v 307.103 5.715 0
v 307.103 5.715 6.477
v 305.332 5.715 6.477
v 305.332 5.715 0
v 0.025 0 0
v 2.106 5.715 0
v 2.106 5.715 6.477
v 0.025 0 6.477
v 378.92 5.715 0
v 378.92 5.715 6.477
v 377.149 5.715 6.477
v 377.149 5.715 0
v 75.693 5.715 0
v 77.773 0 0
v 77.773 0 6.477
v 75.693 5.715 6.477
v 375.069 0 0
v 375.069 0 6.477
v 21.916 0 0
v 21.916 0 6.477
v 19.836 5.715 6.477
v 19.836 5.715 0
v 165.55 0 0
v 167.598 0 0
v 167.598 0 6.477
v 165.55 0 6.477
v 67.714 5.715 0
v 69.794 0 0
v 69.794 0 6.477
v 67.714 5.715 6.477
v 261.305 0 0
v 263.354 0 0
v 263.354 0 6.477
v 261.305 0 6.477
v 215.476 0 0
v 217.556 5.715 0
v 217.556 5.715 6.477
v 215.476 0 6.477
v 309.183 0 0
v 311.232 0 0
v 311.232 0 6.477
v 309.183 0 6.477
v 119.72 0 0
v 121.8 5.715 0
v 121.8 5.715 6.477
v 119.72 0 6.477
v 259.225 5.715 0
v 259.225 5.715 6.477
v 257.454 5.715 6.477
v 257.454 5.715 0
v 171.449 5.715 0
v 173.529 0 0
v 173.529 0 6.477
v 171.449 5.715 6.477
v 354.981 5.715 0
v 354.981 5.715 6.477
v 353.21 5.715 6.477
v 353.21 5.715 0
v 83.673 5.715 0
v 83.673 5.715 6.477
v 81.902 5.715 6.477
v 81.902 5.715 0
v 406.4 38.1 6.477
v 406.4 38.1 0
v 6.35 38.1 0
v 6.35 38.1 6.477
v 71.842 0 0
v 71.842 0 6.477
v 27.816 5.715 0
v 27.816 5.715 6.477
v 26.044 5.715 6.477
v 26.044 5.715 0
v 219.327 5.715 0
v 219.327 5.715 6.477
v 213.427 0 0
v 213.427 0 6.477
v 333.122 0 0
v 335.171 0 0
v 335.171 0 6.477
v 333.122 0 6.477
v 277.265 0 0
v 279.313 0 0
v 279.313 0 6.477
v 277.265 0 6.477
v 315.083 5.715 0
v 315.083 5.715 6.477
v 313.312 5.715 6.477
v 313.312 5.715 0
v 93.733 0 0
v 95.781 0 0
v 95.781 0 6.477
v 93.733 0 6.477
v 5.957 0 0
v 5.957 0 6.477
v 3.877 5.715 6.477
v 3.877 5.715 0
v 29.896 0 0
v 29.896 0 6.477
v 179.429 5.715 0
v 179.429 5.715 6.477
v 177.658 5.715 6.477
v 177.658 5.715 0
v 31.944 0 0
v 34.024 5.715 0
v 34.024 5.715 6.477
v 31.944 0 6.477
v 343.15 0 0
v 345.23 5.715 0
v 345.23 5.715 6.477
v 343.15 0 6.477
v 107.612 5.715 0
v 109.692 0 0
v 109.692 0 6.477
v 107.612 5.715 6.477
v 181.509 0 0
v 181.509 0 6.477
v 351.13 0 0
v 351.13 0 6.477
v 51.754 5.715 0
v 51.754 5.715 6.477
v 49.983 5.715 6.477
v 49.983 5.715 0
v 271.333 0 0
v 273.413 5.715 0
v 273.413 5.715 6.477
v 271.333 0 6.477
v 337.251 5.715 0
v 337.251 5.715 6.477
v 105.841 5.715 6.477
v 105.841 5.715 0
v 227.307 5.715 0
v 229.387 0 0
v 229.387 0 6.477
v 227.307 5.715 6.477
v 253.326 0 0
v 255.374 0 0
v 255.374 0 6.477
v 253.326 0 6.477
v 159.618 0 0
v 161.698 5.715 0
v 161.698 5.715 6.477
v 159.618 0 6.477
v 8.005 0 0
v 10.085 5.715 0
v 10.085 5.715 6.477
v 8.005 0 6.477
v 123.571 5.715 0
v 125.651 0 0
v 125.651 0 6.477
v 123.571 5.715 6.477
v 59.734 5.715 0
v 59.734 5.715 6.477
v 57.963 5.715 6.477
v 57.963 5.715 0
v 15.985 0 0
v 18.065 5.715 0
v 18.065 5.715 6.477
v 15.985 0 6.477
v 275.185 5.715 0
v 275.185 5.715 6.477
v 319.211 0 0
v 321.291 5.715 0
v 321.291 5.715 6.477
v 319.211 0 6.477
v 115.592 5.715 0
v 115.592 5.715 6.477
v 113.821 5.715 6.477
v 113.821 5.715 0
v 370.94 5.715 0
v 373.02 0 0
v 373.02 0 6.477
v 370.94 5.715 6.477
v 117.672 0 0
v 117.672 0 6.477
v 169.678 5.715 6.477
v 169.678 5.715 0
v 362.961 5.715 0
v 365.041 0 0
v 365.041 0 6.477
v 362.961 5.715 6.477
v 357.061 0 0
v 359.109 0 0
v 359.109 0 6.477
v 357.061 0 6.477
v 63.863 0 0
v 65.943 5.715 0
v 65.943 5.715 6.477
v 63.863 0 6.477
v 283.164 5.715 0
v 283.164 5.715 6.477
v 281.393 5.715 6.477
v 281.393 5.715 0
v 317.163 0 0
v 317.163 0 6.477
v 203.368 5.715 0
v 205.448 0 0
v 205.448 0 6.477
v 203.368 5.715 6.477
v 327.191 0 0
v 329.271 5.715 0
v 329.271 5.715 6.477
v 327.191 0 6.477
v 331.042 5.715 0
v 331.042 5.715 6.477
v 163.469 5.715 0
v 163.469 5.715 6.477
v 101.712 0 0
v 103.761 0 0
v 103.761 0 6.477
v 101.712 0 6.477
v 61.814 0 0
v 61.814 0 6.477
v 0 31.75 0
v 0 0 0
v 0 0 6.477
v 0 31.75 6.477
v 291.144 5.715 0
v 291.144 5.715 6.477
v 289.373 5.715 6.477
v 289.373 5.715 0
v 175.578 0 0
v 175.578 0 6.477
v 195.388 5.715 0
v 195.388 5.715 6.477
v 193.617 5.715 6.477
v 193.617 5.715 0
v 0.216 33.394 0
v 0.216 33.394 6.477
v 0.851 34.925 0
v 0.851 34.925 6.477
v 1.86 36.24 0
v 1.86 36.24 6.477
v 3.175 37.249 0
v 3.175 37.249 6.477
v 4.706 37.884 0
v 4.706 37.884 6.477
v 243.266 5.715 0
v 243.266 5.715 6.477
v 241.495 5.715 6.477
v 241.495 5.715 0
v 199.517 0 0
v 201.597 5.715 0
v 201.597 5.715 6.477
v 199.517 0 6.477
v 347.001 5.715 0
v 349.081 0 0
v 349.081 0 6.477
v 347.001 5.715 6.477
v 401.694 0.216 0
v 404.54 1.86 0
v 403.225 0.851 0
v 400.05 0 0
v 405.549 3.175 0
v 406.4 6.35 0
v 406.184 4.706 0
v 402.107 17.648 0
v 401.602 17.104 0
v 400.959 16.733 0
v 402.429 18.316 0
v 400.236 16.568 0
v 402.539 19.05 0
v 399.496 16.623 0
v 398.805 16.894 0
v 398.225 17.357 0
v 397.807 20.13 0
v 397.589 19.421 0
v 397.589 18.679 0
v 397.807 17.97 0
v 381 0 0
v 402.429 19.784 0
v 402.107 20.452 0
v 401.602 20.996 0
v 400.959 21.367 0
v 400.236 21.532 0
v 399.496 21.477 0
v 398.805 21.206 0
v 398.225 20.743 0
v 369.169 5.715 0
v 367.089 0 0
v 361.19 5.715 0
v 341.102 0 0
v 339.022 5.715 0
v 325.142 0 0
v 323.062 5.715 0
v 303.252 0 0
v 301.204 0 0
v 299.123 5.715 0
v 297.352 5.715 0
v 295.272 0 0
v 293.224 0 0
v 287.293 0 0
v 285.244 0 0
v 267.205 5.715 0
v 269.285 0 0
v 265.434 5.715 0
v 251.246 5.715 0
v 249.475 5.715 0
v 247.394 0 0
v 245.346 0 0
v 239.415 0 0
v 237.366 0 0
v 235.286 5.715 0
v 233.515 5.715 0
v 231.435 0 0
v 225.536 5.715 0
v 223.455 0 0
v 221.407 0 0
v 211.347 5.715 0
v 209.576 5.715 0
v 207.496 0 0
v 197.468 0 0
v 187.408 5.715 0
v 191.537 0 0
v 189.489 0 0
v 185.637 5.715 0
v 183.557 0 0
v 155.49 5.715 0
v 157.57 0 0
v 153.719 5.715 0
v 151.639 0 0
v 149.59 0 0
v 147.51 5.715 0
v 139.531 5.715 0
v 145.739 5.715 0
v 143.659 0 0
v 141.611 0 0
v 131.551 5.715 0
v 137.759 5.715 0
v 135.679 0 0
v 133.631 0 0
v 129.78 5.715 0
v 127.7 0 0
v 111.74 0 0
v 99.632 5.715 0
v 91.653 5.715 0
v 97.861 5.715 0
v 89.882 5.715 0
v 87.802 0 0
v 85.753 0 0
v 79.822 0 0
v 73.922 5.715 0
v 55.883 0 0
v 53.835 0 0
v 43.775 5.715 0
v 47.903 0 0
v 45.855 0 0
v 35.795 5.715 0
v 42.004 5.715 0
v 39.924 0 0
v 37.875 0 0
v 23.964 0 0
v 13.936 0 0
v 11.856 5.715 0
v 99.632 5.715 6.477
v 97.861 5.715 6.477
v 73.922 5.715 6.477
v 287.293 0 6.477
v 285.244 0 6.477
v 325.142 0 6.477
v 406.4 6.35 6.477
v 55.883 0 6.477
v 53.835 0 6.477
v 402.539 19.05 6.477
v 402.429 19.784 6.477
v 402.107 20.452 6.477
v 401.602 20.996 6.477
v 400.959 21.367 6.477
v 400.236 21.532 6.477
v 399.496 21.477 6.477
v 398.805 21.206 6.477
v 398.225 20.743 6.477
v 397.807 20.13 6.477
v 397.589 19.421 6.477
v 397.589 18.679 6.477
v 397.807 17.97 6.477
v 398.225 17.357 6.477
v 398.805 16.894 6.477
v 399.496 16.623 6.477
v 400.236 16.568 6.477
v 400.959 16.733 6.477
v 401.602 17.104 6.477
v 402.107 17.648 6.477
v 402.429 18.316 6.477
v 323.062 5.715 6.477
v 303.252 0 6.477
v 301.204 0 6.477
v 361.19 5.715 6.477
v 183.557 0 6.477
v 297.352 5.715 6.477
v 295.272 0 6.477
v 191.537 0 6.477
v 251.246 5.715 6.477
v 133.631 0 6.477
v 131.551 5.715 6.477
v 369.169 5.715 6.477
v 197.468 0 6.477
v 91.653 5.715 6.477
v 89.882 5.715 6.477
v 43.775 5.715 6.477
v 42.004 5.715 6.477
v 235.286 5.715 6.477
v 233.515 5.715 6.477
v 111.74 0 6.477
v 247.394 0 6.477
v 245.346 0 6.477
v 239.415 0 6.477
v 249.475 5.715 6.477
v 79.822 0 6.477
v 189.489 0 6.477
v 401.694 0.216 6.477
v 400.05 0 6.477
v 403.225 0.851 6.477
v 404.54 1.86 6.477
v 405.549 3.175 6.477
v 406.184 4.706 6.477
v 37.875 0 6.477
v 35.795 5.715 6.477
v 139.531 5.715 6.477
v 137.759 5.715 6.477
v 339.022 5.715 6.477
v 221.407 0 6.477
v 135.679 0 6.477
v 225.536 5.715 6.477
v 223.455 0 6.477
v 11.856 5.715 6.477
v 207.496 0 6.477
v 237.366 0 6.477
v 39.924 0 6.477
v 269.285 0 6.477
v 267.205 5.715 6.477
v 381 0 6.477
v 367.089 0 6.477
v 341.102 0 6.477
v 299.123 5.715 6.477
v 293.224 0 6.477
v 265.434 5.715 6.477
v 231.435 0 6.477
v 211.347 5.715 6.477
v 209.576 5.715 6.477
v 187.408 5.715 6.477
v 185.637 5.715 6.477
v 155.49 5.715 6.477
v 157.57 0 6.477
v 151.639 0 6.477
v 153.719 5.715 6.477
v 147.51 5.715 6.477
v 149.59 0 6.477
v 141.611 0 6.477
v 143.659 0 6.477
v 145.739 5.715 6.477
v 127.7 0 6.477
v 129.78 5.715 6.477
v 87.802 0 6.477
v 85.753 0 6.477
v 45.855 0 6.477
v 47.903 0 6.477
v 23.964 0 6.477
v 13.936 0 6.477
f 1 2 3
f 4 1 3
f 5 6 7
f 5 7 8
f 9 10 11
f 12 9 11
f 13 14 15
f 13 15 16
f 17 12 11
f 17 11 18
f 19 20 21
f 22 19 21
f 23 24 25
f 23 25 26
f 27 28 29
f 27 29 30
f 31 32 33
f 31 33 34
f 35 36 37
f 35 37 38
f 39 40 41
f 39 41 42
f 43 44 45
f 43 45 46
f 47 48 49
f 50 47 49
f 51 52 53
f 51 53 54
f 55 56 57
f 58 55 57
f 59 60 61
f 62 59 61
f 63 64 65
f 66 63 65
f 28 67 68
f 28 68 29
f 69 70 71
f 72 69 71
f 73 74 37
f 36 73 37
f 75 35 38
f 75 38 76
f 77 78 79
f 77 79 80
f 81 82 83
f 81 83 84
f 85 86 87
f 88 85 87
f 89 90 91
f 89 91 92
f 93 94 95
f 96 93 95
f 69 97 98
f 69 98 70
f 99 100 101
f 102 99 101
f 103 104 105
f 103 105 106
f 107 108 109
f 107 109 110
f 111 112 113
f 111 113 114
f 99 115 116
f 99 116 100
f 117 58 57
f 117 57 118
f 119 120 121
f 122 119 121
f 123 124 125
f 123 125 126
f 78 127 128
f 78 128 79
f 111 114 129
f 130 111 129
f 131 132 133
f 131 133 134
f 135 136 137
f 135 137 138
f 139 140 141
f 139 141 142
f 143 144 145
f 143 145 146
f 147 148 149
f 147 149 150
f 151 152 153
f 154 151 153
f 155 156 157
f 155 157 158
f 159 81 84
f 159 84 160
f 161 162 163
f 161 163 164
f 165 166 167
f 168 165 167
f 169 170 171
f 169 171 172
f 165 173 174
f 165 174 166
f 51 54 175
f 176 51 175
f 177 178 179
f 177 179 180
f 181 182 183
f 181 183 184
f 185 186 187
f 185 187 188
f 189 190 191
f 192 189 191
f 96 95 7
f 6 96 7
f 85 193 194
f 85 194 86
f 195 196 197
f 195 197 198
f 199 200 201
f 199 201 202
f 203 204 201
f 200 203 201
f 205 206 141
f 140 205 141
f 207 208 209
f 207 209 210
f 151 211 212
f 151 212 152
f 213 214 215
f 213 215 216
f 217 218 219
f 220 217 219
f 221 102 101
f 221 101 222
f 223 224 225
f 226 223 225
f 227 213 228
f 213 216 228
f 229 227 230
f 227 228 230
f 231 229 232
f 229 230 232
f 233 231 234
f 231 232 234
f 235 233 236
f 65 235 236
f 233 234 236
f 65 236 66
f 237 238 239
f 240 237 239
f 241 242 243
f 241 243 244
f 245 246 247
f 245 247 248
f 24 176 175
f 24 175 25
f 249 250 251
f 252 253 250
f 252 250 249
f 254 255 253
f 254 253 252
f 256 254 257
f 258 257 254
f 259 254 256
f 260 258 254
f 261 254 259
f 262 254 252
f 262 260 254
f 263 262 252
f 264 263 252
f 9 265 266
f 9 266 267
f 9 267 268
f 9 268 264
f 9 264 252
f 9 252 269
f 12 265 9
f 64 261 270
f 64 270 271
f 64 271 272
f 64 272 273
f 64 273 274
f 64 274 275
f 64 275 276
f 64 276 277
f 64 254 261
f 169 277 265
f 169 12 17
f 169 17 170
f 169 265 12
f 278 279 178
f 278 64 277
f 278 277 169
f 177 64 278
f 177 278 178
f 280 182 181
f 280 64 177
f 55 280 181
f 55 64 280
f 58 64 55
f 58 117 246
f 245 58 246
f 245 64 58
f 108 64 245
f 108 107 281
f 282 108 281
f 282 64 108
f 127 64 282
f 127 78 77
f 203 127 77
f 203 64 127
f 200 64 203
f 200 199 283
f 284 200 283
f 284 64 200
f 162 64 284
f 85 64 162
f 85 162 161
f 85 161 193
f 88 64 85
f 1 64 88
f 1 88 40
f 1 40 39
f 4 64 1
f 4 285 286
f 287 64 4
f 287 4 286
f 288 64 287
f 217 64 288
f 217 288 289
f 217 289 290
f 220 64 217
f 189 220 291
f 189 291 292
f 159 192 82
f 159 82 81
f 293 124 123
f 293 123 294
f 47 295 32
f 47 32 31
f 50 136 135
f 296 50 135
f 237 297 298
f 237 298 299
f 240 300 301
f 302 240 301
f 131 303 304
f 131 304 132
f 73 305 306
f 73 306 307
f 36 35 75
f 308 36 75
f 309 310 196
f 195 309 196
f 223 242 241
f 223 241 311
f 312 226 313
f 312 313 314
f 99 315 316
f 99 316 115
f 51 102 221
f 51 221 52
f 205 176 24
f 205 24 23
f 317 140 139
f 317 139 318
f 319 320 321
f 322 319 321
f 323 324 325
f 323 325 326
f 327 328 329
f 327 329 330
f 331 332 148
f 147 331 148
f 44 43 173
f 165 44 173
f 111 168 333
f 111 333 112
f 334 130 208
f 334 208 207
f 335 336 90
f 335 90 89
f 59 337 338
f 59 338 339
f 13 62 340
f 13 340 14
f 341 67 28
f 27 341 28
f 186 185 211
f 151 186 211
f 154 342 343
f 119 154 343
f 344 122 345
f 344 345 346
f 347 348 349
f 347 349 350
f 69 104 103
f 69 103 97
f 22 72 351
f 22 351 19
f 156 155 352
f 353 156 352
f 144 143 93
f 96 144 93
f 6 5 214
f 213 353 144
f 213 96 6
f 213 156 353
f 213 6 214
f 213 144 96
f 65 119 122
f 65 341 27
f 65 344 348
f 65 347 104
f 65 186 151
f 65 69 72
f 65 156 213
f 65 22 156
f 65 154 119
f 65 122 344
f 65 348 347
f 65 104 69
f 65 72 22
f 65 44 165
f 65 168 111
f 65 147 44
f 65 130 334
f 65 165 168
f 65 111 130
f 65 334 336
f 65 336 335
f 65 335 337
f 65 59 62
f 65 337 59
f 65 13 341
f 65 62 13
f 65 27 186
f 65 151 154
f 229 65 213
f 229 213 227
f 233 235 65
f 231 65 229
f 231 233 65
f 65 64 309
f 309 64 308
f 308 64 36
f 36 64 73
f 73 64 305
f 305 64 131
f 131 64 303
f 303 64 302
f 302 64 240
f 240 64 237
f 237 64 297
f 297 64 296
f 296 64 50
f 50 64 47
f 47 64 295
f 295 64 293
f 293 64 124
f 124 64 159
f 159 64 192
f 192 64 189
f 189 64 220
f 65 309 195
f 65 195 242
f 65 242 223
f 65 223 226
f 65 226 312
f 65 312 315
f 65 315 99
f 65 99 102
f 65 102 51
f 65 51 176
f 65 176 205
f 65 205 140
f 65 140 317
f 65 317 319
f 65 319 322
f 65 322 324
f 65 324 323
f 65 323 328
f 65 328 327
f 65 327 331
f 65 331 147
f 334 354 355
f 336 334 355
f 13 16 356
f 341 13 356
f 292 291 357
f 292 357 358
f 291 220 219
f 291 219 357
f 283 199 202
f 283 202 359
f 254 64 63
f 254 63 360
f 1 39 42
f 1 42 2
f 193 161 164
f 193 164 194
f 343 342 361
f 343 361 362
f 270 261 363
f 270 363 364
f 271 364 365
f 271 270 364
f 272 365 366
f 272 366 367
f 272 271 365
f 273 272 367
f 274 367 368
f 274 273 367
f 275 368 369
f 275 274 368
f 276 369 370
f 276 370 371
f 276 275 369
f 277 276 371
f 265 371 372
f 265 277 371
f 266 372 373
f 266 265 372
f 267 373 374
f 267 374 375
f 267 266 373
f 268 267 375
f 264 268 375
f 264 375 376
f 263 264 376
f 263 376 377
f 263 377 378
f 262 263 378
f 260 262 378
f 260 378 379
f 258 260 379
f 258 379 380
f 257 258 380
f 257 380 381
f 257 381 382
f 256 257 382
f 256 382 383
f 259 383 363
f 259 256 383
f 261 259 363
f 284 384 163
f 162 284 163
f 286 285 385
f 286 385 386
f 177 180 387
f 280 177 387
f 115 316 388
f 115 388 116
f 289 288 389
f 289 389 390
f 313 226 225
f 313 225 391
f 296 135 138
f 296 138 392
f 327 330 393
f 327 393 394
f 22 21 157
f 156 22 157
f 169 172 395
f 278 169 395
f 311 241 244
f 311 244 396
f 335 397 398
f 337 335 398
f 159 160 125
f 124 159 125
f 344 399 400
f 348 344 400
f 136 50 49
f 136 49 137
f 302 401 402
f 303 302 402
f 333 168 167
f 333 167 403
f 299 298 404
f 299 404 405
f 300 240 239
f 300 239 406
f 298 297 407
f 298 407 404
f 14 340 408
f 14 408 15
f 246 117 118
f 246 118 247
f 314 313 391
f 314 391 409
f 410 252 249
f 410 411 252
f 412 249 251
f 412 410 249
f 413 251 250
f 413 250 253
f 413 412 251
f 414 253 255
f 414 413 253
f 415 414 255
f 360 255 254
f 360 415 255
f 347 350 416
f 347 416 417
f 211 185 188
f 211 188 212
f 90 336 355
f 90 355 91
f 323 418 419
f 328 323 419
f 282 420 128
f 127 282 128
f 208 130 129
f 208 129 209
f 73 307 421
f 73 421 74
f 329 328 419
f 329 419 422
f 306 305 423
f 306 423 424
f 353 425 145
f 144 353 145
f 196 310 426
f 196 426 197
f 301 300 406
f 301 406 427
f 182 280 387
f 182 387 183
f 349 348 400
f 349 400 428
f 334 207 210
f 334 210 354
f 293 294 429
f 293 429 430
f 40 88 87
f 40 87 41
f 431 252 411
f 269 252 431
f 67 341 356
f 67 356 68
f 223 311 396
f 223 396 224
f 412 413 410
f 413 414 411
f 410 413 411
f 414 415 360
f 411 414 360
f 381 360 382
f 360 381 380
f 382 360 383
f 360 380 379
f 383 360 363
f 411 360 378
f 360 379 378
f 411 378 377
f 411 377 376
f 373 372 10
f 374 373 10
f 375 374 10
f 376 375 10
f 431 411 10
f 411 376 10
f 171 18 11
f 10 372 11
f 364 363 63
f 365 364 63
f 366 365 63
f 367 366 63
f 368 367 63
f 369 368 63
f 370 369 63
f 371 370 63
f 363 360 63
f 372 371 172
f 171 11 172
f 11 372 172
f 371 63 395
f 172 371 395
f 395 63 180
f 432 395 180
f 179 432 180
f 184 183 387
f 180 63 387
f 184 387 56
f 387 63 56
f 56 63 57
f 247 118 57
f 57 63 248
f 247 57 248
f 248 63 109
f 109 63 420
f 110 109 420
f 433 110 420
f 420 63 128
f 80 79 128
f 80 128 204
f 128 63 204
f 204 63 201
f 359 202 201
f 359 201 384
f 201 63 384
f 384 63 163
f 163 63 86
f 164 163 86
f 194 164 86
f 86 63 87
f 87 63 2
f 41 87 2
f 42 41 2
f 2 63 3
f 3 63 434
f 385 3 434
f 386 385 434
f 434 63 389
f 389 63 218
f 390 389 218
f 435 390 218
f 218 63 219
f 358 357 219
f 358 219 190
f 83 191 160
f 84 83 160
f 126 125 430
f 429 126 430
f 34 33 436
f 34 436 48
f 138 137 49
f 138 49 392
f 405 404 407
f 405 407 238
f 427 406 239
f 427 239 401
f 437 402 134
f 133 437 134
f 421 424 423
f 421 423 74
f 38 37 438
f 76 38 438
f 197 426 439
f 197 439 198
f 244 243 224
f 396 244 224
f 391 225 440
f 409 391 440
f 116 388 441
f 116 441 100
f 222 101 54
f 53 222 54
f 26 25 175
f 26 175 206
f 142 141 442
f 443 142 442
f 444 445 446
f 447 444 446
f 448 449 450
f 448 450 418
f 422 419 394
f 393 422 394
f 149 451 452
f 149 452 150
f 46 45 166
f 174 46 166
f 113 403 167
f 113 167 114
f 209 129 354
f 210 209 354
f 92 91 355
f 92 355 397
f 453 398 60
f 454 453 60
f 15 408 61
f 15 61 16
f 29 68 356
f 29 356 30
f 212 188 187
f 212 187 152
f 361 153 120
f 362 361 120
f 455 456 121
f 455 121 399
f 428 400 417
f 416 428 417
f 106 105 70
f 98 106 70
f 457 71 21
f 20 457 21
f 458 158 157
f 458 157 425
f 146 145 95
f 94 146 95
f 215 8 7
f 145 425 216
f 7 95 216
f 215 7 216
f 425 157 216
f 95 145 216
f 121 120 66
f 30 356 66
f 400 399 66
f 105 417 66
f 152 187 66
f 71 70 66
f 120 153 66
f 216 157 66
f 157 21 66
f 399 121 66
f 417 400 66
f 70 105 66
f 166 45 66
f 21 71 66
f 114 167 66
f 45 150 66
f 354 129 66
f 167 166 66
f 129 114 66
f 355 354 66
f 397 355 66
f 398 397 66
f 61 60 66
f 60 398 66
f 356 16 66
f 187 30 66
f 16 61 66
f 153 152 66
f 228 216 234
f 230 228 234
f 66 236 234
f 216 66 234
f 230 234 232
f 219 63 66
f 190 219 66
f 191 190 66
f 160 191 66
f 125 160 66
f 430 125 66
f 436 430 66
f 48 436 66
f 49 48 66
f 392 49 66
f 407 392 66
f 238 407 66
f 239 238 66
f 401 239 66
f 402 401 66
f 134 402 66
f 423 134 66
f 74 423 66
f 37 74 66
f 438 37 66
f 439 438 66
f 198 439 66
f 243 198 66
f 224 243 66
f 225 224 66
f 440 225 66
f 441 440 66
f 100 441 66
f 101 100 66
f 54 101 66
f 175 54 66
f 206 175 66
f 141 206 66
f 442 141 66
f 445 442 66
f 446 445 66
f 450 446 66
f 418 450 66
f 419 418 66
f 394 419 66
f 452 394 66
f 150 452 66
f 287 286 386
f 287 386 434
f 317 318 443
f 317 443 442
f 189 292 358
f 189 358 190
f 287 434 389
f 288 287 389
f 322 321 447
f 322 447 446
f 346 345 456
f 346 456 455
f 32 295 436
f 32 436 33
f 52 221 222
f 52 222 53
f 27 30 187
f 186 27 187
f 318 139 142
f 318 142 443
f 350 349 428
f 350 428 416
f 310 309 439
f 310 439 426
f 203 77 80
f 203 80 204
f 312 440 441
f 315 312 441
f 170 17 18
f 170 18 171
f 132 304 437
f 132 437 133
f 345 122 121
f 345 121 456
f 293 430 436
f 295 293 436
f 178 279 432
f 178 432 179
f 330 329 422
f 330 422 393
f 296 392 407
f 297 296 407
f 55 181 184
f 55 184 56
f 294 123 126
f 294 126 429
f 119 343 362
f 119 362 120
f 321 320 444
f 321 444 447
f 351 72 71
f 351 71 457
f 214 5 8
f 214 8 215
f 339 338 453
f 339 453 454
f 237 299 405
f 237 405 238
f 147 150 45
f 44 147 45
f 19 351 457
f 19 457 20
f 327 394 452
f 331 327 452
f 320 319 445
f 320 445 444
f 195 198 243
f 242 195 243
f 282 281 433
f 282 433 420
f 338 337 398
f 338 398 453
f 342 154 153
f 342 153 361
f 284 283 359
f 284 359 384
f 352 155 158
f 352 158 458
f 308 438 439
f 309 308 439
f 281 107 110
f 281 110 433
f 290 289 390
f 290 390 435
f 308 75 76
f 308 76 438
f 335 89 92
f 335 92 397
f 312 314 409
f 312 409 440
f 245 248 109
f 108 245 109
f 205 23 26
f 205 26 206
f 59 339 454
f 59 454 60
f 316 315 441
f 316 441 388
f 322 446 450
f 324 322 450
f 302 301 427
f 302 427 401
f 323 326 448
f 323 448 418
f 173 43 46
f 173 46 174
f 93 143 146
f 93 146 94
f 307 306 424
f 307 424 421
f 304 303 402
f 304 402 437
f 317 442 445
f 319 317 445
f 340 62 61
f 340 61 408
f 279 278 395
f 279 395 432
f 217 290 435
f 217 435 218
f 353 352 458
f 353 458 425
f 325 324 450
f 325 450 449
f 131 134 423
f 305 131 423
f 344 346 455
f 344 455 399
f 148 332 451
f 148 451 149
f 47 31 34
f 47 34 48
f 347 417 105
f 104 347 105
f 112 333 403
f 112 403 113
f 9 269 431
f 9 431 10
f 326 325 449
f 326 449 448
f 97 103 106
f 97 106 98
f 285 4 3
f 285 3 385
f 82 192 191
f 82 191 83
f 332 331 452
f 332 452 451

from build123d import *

# Parameters (mm, degrees)
SKETCH1_R           = 2.4892
BOSS_EXTRUDE1_DEPTH = 6.477
FILLET2_R           = 6.35
CUT_EXTRUDE1_DEPTH  = 409.233415498
LPATTERN1_COUNT     = 61
LPATTERN1_PITCH     = 7.979645331


with BuildPart() as part:
    # Sketch1 → Boss-Extrude1 (new body)
    with BuildSketch(Plane.XY):
        Polygon((0, 0), (0, 38.1), (40.53078, 38.1), (406.4, 38.1), (406.4, 0), align=None)
        with Locations((400.05, 19.05)):
            Circle(SKETCH1_R, mode=Mode.SUBTRACT)
    extrude(amount=BOSS_EXTRUDE1_DEPTH)

    # Fillet2
    fillet2_edges = [part.edges().sort_by_distance(p)[0] for p in [
        (0, 38.1, 3.2385),
        (406.4, 0, 3.2385),
    ]]
    fillet(fillet2_edges, radius=FILLET2_R)

    # Sketch2 → Cut-Extrude1 (cut, through all)
    with BuildSketch(Plane.XY.offset(6.477)):
        Polygon((375.06876001, 0), (381, 0), (378.919910111, 5.715), (377.148849899, 5.715), align=None)
    cut_extrude1 = extrude(amount=-CUT_EXTRUDE1_DEPTH, mode=Mode.SUBTRACT)

    # LPattern1: Cut-Extrude1 ×61
    with Locations(*[(-i * LPATTERN1_PITCH, 0, 0) for i in range(1, LPATTERN1_COUNT)]):
        add(cut_extrude1, mode=Mode.SUBTRACT)


solid = part.part
